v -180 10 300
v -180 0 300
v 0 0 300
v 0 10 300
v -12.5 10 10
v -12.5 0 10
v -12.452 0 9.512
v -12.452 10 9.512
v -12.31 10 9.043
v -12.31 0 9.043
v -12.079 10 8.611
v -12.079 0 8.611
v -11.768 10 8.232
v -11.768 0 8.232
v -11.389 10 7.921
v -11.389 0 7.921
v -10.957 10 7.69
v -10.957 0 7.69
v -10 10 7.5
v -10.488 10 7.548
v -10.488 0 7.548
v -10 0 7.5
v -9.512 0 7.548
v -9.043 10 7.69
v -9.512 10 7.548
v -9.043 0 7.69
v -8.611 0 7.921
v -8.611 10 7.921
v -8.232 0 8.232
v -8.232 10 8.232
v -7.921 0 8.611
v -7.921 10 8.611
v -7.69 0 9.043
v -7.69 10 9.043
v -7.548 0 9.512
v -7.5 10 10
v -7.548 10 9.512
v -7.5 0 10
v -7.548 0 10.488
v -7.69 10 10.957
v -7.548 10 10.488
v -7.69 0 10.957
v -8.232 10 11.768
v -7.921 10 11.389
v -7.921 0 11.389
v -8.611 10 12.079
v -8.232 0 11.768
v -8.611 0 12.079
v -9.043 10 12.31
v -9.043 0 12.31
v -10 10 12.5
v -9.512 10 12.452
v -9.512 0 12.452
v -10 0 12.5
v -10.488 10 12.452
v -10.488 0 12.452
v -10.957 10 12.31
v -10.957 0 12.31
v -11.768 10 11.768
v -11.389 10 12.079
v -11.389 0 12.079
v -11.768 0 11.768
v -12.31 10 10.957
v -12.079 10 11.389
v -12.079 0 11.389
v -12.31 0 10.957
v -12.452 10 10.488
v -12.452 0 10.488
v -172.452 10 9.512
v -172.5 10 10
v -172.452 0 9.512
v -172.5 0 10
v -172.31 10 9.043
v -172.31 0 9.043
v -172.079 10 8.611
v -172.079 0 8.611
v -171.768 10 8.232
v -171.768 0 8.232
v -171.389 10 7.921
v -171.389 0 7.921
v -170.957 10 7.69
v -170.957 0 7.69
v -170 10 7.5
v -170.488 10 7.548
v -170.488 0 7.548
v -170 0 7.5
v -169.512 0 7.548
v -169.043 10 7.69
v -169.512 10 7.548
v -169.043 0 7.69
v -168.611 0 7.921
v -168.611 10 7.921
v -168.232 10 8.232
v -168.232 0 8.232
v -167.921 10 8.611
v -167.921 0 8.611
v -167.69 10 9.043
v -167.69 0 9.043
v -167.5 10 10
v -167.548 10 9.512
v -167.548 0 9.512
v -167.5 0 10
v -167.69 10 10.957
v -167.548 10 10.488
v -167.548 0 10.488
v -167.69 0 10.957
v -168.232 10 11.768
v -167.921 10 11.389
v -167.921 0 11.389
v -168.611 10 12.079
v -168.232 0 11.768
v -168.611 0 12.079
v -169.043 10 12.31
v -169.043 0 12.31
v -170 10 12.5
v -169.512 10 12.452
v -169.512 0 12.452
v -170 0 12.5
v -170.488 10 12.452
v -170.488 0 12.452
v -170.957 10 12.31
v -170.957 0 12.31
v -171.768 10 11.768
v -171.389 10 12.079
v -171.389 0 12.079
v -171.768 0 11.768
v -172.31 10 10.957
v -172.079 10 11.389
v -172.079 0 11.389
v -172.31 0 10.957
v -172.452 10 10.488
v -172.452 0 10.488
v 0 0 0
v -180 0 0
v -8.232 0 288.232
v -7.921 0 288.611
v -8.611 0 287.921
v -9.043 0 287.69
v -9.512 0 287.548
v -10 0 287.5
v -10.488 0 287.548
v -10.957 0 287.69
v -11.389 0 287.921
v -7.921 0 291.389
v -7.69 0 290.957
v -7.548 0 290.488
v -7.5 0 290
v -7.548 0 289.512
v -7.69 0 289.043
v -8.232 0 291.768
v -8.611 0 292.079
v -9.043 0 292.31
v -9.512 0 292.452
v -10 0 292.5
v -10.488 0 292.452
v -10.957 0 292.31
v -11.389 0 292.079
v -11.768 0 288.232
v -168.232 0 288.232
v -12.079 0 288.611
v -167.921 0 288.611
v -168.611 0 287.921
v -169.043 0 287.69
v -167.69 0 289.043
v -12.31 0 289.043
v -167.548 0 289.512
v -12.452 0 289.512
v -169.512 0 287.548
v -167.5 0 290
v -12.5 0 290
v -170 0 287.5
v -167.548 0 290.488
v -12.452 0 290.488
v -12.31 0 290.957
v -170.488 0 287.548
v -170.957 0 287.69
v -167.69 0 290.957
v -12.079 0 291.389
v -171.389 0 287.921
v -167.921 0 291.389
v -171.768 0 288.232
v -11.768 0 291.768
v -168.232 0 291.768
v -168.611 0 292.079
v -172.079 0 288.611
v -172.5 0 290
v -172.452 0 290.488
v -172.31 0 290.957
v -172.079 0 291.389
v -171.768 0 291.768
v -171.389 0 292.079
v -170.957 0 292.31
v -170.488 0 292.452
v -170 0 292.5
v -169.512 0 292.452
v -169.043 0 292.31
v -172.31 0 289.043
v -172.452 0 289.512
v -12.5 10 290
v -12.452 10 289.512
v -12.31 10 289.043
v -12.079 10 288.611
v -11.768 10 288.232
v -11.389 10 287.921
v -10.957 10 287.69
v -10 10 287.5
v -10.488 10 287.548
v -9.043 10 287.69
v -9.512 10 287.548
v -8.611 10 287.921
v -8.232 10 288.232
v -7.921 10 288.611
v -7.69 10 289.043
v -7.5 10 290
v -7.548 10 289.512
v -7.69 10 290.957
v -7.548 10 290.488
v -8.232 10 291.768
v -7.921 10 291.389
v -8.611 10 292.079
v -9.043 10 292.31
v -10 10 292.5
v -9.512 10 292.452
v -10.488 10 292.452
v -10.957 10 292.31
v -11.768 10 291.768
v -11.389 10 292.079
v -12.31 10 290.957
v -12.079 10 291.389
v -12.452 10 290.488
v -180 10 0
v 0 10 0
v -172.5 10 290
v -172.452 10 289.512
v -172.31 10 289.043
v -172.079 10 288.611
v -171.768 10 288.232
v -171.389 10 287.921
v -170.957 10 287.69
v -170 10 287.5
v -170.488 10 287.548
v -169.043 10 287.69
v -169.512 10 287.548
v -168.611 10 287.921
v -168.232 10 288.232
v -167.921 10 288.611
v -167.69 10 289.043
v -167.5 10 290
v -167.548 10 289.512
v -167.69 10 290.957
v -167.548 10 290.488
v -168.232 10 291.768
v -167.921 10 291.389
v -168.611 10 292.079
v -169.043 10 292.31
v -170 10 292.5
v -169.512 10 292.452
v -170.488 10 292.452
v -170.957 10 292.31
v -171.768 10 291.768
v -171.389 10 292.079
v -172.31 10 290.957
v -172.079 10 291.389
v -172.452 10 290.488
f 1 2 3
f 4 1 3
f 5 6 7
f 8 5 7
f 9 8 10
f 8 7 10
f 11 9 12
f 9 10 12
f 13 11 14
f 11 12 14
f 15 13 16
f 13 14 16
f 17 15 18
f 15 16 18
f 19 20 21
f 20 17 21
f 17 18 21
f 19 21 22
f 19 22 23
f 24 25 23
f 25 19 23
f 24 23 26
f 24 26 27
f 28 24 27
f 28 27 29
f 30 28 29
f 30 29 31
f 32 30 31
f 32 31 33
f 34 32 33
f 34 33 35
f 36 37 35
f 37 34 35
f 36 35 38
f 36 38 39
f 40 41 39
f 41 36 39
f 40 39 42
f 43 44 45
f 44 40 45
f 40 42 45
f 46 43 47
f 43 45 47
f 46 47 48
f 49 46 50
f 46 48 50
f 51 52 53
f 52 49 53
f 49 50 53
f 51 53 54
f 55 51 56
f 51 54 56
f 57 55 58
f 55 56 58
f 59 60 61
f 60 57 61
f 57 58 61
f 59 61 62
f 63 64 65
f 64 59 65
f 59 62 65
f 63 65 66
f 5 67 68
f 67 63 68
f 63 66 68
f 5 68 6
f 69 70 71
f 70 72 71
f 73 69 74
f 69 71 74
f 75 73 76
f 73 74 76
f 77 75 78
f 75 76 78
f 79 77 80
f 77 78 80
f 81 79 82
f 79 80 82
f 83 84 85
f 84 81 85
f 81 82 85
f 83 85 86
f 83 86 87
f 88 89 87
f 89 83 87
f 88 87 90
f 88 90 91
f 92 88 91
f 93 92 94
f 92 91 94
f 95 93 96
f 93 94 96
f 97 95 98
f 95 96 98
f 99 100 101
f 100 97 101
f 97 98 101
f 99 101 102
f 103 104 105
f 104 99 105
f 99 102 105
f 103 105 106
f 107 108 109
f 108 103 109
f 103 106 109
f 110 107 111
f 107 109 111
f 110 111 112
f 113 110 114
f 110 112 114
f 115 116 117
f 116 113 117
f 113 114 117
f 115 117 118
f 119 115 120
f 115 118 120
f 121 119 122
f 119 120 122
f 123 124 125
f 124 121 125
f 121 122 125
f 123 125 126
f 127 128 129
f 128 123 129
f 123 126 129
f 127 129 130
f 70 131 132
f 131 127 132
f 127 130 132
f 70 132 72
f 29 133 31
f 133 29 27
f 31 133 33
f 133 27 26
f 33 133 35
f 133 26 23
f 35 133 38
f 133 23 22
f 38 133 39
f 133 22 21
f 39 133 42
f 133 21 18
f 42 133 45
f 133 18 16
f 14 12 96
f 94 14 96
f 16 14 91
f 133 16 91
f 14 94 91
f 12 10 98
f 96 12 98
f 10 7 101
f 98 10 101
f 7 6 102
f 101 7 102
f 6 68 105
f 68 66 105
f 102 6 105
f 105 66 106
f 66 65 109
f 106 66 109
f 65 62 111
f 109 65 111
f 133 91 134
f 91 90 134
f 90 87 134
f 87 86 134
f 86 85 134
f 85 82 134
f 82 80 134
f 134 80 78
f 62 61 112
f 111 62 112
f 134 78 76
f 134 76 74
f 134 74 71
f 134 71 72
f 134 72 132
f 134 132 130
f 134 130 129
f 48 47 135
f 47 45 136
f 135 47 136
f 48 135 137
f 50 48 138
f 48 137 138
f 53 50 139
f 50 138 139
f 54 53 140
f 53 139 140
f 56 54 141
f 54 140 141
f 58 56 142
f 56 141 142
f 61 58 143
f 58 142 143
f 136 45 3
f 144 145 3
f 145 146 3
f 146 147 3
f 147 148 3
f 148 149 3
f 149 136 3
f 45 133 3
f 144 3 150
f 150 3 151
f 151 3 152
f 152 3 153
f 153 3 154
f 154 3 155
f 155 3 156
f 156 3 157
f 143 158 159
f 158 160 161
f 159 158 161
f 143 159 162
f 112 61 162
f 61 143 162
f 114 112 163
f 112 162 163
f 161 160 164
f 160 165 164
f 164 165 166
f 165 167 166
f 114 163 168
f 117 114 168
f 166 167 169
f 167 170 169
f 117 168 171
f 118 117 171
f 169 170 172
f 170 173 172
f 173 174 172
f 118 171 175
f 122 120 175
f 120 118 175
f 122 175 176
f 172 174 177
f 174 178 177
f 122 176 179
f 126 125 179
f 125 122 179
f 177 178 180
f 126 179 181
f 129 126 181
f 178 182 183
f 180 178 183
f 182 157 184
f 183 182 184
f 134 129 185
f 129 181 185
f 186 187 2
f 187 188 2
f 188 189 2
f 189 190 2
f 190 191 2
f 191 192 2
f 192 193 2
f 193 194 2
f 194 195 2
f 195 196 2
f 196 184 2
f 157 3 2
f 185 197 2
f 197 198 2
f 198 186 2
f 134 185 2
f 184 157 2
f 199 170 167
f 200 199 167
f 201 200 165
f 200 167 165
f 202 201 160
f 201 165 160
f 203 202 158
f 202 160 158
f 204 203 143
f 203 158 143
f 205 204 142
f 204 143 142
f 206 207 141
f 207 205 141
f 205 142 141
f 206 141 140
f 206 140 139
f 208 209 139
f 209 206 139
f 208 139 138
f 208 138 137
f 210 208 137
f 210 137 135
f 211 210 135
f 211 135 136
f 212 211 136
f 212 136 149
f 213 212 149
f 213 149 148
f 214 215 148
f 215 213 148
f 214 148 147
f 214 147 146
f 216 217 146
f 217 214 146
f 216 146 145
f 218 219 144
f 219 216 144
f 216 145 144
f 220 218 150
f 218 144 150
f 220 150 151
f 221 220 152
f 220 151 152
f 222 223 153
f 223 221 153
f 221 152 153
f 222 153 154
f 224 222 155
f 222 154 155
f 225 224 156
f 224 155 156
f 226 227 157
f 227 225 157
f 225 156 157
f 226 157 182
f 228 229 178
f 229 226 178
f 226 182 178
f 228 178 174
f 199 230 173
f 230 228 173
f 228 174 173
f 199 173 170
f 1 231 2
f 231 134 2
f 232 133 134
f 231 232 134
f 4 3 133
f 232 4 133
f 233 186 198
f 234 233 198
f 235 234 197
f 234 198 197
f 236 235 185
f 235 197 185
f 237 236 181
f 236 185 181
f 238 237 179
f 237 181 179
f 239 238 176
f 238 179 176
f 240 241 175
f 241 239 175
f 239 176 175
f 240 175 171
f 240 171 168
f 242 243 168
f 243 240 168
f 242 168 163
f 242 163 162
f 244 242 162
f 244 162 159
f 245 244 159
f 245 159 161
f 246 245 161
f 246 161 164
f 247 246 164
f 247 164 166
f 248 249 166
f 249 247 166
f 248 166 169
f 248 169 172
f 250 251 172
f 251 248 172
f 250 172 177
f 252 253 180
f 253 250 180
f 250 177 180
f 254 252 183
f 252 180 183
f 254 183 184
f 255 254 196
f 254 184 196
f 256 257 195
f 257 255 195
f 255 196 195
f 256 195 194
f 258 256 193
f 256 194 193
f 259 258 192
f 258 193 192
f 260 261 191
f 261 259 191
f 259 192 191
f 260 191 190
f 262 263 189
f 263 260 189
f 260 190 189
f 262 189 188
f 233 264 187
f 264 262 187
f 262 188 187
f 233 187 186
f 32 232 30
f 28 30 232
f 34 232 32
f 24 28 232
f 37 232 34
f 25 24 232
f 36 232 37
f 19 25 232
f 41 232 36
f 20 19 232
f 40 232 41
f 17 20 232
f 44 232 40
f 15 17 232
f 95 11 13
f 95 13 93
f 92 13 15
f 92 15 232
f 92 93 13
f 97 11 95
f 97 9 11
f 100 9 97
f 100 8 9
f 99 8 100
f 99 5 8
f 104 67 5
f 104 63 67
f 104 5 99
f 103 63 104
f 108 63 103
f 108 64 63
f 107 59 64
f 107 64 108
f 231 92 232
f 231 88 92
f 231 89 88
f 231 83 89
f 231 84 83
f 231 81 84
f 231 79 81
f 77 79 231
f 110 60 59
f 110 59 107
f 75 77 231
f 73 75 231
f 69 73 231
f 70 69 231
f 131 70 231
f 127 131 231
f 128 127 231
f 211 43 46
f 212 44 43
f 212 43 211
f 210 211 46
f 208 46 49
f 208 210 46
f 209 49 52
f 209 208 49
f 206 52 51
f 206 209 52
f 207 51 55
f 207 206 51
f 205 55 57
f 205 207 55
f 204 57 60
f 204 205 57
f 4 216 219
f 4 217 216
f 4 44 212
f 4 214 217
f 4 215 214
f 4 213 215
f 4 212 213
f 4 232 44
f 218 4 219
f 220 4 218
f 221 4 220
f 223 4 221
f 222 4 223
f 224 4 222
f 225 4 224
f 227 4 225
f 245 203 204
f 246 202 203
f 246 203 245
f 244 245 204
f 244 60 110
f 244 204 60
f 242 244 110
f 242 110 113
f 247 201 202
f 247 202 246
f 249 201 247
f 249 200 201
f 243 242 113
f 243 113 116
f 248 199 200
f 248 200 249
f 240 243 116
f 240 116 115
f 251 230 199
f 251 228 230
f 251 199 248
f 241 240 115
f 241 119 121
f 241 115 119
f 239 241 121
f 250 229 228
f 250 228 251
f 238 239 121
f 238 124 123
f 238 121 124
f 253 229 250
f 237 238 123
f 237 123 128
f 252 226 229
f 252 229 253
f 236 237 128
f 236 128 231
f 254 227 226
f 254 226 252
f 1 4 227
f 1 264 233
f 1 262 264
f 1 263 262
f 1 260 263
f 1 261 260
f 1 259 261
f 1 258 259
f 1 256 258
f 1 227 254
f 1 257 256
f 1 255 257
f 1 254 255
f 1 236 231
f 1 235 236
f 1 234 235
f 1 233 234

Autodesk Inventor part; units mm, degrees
ref_plane "YZ Plane" through (0, 0, 0) normal (1, 0, 0) x (0, 1, 0)
ref_plane "XZ Plane" through (0, 0, 0) normal (0, 1, 0) x (-1, 0, 0)
ref_plane "XY Plane" through (0, 0, 0) normal (0, 0, 1) x (1, 0, 0)
sketch "Block1" plane through (0, 0, 0) normal (0, 0, 1) x (1, 0, 0)
  line L0 (-180.22, 0.22) -> (0.22, 0.22)
  line L1 (0.22, 0.22) -> (0.22, -300.22)
  line L2 (0.22, -300.22) -> (-180.22, -300.22)
  line L3 (-180.22, -300.22) -> (-180.22, 0.22)
  circle A0 centre (-170, -10) radius 2.72
  circle A1 centre (-10, -10) radius 2.72
  circle A2 centre (-170, -290) radius 2.72
  circle A3 centre (-10, -290) radius 2.72
  point P0 (-90, -150)
sketch "Sketch1" plane through (0, 0, 0) normal (0, 1, 0) x (-1, 0, 0)
  line L0 (0, 0) -> (180, 0)
  line L1 (180, 0) -> (180, 300)
  line L2 (180, 300) -> (0, 300)
  line L3 (0, 300) -> (0, 0)
  circle A0 centre (170, 10) radius 2.5
  line L4 (90, -51.0064) -> (90, 353.269)
  line L5 (216.4039, 150) -> (-14.4683, 150)
  circle A1 centre (10, 10) radius 2.5
  circle A2 centre (170, 290) radius 2.5
  circle A3 centre (10, 290) radius 2.5
  dimension "d0" = 180
  dimension "d1" = 300
  dimension "d4" = 5
  dimension "d5" = 10
  dimension "d6" = 10
  dimension "d7" = 90
  dimension "d8" = 150
extrude "Extrusion2" add sketch "Sketch1" along normal blind 10
sketch "Sketch2" plane through (0, 10, 0) normal (0, 1, 0) x (1, 0, 0)
  circle A0 centre (-10, -290) radius 2.5 projected
  circle A1 centre (-170, -290) radius 2.5 projected
  circle A2 centre (-10, -10) radius 2.5 projected
  circle A3 centre (-170, -10) radius 2.5 projected
  line L0 (0, 0) -> (-180, 0) projected
  line L1 (-180, 0) -> (-180, -300) projected
  line L2 (-180, -300) -> (0, -300) projected
  line L3 (0, -300) -> (0, 0) projected
sketch "DXF" plane through (0, 0, 0) normal (0, 1, 0) x (-1, 0, 0)
  point P0 (0, 0)
properties part number "sideplate_top"
